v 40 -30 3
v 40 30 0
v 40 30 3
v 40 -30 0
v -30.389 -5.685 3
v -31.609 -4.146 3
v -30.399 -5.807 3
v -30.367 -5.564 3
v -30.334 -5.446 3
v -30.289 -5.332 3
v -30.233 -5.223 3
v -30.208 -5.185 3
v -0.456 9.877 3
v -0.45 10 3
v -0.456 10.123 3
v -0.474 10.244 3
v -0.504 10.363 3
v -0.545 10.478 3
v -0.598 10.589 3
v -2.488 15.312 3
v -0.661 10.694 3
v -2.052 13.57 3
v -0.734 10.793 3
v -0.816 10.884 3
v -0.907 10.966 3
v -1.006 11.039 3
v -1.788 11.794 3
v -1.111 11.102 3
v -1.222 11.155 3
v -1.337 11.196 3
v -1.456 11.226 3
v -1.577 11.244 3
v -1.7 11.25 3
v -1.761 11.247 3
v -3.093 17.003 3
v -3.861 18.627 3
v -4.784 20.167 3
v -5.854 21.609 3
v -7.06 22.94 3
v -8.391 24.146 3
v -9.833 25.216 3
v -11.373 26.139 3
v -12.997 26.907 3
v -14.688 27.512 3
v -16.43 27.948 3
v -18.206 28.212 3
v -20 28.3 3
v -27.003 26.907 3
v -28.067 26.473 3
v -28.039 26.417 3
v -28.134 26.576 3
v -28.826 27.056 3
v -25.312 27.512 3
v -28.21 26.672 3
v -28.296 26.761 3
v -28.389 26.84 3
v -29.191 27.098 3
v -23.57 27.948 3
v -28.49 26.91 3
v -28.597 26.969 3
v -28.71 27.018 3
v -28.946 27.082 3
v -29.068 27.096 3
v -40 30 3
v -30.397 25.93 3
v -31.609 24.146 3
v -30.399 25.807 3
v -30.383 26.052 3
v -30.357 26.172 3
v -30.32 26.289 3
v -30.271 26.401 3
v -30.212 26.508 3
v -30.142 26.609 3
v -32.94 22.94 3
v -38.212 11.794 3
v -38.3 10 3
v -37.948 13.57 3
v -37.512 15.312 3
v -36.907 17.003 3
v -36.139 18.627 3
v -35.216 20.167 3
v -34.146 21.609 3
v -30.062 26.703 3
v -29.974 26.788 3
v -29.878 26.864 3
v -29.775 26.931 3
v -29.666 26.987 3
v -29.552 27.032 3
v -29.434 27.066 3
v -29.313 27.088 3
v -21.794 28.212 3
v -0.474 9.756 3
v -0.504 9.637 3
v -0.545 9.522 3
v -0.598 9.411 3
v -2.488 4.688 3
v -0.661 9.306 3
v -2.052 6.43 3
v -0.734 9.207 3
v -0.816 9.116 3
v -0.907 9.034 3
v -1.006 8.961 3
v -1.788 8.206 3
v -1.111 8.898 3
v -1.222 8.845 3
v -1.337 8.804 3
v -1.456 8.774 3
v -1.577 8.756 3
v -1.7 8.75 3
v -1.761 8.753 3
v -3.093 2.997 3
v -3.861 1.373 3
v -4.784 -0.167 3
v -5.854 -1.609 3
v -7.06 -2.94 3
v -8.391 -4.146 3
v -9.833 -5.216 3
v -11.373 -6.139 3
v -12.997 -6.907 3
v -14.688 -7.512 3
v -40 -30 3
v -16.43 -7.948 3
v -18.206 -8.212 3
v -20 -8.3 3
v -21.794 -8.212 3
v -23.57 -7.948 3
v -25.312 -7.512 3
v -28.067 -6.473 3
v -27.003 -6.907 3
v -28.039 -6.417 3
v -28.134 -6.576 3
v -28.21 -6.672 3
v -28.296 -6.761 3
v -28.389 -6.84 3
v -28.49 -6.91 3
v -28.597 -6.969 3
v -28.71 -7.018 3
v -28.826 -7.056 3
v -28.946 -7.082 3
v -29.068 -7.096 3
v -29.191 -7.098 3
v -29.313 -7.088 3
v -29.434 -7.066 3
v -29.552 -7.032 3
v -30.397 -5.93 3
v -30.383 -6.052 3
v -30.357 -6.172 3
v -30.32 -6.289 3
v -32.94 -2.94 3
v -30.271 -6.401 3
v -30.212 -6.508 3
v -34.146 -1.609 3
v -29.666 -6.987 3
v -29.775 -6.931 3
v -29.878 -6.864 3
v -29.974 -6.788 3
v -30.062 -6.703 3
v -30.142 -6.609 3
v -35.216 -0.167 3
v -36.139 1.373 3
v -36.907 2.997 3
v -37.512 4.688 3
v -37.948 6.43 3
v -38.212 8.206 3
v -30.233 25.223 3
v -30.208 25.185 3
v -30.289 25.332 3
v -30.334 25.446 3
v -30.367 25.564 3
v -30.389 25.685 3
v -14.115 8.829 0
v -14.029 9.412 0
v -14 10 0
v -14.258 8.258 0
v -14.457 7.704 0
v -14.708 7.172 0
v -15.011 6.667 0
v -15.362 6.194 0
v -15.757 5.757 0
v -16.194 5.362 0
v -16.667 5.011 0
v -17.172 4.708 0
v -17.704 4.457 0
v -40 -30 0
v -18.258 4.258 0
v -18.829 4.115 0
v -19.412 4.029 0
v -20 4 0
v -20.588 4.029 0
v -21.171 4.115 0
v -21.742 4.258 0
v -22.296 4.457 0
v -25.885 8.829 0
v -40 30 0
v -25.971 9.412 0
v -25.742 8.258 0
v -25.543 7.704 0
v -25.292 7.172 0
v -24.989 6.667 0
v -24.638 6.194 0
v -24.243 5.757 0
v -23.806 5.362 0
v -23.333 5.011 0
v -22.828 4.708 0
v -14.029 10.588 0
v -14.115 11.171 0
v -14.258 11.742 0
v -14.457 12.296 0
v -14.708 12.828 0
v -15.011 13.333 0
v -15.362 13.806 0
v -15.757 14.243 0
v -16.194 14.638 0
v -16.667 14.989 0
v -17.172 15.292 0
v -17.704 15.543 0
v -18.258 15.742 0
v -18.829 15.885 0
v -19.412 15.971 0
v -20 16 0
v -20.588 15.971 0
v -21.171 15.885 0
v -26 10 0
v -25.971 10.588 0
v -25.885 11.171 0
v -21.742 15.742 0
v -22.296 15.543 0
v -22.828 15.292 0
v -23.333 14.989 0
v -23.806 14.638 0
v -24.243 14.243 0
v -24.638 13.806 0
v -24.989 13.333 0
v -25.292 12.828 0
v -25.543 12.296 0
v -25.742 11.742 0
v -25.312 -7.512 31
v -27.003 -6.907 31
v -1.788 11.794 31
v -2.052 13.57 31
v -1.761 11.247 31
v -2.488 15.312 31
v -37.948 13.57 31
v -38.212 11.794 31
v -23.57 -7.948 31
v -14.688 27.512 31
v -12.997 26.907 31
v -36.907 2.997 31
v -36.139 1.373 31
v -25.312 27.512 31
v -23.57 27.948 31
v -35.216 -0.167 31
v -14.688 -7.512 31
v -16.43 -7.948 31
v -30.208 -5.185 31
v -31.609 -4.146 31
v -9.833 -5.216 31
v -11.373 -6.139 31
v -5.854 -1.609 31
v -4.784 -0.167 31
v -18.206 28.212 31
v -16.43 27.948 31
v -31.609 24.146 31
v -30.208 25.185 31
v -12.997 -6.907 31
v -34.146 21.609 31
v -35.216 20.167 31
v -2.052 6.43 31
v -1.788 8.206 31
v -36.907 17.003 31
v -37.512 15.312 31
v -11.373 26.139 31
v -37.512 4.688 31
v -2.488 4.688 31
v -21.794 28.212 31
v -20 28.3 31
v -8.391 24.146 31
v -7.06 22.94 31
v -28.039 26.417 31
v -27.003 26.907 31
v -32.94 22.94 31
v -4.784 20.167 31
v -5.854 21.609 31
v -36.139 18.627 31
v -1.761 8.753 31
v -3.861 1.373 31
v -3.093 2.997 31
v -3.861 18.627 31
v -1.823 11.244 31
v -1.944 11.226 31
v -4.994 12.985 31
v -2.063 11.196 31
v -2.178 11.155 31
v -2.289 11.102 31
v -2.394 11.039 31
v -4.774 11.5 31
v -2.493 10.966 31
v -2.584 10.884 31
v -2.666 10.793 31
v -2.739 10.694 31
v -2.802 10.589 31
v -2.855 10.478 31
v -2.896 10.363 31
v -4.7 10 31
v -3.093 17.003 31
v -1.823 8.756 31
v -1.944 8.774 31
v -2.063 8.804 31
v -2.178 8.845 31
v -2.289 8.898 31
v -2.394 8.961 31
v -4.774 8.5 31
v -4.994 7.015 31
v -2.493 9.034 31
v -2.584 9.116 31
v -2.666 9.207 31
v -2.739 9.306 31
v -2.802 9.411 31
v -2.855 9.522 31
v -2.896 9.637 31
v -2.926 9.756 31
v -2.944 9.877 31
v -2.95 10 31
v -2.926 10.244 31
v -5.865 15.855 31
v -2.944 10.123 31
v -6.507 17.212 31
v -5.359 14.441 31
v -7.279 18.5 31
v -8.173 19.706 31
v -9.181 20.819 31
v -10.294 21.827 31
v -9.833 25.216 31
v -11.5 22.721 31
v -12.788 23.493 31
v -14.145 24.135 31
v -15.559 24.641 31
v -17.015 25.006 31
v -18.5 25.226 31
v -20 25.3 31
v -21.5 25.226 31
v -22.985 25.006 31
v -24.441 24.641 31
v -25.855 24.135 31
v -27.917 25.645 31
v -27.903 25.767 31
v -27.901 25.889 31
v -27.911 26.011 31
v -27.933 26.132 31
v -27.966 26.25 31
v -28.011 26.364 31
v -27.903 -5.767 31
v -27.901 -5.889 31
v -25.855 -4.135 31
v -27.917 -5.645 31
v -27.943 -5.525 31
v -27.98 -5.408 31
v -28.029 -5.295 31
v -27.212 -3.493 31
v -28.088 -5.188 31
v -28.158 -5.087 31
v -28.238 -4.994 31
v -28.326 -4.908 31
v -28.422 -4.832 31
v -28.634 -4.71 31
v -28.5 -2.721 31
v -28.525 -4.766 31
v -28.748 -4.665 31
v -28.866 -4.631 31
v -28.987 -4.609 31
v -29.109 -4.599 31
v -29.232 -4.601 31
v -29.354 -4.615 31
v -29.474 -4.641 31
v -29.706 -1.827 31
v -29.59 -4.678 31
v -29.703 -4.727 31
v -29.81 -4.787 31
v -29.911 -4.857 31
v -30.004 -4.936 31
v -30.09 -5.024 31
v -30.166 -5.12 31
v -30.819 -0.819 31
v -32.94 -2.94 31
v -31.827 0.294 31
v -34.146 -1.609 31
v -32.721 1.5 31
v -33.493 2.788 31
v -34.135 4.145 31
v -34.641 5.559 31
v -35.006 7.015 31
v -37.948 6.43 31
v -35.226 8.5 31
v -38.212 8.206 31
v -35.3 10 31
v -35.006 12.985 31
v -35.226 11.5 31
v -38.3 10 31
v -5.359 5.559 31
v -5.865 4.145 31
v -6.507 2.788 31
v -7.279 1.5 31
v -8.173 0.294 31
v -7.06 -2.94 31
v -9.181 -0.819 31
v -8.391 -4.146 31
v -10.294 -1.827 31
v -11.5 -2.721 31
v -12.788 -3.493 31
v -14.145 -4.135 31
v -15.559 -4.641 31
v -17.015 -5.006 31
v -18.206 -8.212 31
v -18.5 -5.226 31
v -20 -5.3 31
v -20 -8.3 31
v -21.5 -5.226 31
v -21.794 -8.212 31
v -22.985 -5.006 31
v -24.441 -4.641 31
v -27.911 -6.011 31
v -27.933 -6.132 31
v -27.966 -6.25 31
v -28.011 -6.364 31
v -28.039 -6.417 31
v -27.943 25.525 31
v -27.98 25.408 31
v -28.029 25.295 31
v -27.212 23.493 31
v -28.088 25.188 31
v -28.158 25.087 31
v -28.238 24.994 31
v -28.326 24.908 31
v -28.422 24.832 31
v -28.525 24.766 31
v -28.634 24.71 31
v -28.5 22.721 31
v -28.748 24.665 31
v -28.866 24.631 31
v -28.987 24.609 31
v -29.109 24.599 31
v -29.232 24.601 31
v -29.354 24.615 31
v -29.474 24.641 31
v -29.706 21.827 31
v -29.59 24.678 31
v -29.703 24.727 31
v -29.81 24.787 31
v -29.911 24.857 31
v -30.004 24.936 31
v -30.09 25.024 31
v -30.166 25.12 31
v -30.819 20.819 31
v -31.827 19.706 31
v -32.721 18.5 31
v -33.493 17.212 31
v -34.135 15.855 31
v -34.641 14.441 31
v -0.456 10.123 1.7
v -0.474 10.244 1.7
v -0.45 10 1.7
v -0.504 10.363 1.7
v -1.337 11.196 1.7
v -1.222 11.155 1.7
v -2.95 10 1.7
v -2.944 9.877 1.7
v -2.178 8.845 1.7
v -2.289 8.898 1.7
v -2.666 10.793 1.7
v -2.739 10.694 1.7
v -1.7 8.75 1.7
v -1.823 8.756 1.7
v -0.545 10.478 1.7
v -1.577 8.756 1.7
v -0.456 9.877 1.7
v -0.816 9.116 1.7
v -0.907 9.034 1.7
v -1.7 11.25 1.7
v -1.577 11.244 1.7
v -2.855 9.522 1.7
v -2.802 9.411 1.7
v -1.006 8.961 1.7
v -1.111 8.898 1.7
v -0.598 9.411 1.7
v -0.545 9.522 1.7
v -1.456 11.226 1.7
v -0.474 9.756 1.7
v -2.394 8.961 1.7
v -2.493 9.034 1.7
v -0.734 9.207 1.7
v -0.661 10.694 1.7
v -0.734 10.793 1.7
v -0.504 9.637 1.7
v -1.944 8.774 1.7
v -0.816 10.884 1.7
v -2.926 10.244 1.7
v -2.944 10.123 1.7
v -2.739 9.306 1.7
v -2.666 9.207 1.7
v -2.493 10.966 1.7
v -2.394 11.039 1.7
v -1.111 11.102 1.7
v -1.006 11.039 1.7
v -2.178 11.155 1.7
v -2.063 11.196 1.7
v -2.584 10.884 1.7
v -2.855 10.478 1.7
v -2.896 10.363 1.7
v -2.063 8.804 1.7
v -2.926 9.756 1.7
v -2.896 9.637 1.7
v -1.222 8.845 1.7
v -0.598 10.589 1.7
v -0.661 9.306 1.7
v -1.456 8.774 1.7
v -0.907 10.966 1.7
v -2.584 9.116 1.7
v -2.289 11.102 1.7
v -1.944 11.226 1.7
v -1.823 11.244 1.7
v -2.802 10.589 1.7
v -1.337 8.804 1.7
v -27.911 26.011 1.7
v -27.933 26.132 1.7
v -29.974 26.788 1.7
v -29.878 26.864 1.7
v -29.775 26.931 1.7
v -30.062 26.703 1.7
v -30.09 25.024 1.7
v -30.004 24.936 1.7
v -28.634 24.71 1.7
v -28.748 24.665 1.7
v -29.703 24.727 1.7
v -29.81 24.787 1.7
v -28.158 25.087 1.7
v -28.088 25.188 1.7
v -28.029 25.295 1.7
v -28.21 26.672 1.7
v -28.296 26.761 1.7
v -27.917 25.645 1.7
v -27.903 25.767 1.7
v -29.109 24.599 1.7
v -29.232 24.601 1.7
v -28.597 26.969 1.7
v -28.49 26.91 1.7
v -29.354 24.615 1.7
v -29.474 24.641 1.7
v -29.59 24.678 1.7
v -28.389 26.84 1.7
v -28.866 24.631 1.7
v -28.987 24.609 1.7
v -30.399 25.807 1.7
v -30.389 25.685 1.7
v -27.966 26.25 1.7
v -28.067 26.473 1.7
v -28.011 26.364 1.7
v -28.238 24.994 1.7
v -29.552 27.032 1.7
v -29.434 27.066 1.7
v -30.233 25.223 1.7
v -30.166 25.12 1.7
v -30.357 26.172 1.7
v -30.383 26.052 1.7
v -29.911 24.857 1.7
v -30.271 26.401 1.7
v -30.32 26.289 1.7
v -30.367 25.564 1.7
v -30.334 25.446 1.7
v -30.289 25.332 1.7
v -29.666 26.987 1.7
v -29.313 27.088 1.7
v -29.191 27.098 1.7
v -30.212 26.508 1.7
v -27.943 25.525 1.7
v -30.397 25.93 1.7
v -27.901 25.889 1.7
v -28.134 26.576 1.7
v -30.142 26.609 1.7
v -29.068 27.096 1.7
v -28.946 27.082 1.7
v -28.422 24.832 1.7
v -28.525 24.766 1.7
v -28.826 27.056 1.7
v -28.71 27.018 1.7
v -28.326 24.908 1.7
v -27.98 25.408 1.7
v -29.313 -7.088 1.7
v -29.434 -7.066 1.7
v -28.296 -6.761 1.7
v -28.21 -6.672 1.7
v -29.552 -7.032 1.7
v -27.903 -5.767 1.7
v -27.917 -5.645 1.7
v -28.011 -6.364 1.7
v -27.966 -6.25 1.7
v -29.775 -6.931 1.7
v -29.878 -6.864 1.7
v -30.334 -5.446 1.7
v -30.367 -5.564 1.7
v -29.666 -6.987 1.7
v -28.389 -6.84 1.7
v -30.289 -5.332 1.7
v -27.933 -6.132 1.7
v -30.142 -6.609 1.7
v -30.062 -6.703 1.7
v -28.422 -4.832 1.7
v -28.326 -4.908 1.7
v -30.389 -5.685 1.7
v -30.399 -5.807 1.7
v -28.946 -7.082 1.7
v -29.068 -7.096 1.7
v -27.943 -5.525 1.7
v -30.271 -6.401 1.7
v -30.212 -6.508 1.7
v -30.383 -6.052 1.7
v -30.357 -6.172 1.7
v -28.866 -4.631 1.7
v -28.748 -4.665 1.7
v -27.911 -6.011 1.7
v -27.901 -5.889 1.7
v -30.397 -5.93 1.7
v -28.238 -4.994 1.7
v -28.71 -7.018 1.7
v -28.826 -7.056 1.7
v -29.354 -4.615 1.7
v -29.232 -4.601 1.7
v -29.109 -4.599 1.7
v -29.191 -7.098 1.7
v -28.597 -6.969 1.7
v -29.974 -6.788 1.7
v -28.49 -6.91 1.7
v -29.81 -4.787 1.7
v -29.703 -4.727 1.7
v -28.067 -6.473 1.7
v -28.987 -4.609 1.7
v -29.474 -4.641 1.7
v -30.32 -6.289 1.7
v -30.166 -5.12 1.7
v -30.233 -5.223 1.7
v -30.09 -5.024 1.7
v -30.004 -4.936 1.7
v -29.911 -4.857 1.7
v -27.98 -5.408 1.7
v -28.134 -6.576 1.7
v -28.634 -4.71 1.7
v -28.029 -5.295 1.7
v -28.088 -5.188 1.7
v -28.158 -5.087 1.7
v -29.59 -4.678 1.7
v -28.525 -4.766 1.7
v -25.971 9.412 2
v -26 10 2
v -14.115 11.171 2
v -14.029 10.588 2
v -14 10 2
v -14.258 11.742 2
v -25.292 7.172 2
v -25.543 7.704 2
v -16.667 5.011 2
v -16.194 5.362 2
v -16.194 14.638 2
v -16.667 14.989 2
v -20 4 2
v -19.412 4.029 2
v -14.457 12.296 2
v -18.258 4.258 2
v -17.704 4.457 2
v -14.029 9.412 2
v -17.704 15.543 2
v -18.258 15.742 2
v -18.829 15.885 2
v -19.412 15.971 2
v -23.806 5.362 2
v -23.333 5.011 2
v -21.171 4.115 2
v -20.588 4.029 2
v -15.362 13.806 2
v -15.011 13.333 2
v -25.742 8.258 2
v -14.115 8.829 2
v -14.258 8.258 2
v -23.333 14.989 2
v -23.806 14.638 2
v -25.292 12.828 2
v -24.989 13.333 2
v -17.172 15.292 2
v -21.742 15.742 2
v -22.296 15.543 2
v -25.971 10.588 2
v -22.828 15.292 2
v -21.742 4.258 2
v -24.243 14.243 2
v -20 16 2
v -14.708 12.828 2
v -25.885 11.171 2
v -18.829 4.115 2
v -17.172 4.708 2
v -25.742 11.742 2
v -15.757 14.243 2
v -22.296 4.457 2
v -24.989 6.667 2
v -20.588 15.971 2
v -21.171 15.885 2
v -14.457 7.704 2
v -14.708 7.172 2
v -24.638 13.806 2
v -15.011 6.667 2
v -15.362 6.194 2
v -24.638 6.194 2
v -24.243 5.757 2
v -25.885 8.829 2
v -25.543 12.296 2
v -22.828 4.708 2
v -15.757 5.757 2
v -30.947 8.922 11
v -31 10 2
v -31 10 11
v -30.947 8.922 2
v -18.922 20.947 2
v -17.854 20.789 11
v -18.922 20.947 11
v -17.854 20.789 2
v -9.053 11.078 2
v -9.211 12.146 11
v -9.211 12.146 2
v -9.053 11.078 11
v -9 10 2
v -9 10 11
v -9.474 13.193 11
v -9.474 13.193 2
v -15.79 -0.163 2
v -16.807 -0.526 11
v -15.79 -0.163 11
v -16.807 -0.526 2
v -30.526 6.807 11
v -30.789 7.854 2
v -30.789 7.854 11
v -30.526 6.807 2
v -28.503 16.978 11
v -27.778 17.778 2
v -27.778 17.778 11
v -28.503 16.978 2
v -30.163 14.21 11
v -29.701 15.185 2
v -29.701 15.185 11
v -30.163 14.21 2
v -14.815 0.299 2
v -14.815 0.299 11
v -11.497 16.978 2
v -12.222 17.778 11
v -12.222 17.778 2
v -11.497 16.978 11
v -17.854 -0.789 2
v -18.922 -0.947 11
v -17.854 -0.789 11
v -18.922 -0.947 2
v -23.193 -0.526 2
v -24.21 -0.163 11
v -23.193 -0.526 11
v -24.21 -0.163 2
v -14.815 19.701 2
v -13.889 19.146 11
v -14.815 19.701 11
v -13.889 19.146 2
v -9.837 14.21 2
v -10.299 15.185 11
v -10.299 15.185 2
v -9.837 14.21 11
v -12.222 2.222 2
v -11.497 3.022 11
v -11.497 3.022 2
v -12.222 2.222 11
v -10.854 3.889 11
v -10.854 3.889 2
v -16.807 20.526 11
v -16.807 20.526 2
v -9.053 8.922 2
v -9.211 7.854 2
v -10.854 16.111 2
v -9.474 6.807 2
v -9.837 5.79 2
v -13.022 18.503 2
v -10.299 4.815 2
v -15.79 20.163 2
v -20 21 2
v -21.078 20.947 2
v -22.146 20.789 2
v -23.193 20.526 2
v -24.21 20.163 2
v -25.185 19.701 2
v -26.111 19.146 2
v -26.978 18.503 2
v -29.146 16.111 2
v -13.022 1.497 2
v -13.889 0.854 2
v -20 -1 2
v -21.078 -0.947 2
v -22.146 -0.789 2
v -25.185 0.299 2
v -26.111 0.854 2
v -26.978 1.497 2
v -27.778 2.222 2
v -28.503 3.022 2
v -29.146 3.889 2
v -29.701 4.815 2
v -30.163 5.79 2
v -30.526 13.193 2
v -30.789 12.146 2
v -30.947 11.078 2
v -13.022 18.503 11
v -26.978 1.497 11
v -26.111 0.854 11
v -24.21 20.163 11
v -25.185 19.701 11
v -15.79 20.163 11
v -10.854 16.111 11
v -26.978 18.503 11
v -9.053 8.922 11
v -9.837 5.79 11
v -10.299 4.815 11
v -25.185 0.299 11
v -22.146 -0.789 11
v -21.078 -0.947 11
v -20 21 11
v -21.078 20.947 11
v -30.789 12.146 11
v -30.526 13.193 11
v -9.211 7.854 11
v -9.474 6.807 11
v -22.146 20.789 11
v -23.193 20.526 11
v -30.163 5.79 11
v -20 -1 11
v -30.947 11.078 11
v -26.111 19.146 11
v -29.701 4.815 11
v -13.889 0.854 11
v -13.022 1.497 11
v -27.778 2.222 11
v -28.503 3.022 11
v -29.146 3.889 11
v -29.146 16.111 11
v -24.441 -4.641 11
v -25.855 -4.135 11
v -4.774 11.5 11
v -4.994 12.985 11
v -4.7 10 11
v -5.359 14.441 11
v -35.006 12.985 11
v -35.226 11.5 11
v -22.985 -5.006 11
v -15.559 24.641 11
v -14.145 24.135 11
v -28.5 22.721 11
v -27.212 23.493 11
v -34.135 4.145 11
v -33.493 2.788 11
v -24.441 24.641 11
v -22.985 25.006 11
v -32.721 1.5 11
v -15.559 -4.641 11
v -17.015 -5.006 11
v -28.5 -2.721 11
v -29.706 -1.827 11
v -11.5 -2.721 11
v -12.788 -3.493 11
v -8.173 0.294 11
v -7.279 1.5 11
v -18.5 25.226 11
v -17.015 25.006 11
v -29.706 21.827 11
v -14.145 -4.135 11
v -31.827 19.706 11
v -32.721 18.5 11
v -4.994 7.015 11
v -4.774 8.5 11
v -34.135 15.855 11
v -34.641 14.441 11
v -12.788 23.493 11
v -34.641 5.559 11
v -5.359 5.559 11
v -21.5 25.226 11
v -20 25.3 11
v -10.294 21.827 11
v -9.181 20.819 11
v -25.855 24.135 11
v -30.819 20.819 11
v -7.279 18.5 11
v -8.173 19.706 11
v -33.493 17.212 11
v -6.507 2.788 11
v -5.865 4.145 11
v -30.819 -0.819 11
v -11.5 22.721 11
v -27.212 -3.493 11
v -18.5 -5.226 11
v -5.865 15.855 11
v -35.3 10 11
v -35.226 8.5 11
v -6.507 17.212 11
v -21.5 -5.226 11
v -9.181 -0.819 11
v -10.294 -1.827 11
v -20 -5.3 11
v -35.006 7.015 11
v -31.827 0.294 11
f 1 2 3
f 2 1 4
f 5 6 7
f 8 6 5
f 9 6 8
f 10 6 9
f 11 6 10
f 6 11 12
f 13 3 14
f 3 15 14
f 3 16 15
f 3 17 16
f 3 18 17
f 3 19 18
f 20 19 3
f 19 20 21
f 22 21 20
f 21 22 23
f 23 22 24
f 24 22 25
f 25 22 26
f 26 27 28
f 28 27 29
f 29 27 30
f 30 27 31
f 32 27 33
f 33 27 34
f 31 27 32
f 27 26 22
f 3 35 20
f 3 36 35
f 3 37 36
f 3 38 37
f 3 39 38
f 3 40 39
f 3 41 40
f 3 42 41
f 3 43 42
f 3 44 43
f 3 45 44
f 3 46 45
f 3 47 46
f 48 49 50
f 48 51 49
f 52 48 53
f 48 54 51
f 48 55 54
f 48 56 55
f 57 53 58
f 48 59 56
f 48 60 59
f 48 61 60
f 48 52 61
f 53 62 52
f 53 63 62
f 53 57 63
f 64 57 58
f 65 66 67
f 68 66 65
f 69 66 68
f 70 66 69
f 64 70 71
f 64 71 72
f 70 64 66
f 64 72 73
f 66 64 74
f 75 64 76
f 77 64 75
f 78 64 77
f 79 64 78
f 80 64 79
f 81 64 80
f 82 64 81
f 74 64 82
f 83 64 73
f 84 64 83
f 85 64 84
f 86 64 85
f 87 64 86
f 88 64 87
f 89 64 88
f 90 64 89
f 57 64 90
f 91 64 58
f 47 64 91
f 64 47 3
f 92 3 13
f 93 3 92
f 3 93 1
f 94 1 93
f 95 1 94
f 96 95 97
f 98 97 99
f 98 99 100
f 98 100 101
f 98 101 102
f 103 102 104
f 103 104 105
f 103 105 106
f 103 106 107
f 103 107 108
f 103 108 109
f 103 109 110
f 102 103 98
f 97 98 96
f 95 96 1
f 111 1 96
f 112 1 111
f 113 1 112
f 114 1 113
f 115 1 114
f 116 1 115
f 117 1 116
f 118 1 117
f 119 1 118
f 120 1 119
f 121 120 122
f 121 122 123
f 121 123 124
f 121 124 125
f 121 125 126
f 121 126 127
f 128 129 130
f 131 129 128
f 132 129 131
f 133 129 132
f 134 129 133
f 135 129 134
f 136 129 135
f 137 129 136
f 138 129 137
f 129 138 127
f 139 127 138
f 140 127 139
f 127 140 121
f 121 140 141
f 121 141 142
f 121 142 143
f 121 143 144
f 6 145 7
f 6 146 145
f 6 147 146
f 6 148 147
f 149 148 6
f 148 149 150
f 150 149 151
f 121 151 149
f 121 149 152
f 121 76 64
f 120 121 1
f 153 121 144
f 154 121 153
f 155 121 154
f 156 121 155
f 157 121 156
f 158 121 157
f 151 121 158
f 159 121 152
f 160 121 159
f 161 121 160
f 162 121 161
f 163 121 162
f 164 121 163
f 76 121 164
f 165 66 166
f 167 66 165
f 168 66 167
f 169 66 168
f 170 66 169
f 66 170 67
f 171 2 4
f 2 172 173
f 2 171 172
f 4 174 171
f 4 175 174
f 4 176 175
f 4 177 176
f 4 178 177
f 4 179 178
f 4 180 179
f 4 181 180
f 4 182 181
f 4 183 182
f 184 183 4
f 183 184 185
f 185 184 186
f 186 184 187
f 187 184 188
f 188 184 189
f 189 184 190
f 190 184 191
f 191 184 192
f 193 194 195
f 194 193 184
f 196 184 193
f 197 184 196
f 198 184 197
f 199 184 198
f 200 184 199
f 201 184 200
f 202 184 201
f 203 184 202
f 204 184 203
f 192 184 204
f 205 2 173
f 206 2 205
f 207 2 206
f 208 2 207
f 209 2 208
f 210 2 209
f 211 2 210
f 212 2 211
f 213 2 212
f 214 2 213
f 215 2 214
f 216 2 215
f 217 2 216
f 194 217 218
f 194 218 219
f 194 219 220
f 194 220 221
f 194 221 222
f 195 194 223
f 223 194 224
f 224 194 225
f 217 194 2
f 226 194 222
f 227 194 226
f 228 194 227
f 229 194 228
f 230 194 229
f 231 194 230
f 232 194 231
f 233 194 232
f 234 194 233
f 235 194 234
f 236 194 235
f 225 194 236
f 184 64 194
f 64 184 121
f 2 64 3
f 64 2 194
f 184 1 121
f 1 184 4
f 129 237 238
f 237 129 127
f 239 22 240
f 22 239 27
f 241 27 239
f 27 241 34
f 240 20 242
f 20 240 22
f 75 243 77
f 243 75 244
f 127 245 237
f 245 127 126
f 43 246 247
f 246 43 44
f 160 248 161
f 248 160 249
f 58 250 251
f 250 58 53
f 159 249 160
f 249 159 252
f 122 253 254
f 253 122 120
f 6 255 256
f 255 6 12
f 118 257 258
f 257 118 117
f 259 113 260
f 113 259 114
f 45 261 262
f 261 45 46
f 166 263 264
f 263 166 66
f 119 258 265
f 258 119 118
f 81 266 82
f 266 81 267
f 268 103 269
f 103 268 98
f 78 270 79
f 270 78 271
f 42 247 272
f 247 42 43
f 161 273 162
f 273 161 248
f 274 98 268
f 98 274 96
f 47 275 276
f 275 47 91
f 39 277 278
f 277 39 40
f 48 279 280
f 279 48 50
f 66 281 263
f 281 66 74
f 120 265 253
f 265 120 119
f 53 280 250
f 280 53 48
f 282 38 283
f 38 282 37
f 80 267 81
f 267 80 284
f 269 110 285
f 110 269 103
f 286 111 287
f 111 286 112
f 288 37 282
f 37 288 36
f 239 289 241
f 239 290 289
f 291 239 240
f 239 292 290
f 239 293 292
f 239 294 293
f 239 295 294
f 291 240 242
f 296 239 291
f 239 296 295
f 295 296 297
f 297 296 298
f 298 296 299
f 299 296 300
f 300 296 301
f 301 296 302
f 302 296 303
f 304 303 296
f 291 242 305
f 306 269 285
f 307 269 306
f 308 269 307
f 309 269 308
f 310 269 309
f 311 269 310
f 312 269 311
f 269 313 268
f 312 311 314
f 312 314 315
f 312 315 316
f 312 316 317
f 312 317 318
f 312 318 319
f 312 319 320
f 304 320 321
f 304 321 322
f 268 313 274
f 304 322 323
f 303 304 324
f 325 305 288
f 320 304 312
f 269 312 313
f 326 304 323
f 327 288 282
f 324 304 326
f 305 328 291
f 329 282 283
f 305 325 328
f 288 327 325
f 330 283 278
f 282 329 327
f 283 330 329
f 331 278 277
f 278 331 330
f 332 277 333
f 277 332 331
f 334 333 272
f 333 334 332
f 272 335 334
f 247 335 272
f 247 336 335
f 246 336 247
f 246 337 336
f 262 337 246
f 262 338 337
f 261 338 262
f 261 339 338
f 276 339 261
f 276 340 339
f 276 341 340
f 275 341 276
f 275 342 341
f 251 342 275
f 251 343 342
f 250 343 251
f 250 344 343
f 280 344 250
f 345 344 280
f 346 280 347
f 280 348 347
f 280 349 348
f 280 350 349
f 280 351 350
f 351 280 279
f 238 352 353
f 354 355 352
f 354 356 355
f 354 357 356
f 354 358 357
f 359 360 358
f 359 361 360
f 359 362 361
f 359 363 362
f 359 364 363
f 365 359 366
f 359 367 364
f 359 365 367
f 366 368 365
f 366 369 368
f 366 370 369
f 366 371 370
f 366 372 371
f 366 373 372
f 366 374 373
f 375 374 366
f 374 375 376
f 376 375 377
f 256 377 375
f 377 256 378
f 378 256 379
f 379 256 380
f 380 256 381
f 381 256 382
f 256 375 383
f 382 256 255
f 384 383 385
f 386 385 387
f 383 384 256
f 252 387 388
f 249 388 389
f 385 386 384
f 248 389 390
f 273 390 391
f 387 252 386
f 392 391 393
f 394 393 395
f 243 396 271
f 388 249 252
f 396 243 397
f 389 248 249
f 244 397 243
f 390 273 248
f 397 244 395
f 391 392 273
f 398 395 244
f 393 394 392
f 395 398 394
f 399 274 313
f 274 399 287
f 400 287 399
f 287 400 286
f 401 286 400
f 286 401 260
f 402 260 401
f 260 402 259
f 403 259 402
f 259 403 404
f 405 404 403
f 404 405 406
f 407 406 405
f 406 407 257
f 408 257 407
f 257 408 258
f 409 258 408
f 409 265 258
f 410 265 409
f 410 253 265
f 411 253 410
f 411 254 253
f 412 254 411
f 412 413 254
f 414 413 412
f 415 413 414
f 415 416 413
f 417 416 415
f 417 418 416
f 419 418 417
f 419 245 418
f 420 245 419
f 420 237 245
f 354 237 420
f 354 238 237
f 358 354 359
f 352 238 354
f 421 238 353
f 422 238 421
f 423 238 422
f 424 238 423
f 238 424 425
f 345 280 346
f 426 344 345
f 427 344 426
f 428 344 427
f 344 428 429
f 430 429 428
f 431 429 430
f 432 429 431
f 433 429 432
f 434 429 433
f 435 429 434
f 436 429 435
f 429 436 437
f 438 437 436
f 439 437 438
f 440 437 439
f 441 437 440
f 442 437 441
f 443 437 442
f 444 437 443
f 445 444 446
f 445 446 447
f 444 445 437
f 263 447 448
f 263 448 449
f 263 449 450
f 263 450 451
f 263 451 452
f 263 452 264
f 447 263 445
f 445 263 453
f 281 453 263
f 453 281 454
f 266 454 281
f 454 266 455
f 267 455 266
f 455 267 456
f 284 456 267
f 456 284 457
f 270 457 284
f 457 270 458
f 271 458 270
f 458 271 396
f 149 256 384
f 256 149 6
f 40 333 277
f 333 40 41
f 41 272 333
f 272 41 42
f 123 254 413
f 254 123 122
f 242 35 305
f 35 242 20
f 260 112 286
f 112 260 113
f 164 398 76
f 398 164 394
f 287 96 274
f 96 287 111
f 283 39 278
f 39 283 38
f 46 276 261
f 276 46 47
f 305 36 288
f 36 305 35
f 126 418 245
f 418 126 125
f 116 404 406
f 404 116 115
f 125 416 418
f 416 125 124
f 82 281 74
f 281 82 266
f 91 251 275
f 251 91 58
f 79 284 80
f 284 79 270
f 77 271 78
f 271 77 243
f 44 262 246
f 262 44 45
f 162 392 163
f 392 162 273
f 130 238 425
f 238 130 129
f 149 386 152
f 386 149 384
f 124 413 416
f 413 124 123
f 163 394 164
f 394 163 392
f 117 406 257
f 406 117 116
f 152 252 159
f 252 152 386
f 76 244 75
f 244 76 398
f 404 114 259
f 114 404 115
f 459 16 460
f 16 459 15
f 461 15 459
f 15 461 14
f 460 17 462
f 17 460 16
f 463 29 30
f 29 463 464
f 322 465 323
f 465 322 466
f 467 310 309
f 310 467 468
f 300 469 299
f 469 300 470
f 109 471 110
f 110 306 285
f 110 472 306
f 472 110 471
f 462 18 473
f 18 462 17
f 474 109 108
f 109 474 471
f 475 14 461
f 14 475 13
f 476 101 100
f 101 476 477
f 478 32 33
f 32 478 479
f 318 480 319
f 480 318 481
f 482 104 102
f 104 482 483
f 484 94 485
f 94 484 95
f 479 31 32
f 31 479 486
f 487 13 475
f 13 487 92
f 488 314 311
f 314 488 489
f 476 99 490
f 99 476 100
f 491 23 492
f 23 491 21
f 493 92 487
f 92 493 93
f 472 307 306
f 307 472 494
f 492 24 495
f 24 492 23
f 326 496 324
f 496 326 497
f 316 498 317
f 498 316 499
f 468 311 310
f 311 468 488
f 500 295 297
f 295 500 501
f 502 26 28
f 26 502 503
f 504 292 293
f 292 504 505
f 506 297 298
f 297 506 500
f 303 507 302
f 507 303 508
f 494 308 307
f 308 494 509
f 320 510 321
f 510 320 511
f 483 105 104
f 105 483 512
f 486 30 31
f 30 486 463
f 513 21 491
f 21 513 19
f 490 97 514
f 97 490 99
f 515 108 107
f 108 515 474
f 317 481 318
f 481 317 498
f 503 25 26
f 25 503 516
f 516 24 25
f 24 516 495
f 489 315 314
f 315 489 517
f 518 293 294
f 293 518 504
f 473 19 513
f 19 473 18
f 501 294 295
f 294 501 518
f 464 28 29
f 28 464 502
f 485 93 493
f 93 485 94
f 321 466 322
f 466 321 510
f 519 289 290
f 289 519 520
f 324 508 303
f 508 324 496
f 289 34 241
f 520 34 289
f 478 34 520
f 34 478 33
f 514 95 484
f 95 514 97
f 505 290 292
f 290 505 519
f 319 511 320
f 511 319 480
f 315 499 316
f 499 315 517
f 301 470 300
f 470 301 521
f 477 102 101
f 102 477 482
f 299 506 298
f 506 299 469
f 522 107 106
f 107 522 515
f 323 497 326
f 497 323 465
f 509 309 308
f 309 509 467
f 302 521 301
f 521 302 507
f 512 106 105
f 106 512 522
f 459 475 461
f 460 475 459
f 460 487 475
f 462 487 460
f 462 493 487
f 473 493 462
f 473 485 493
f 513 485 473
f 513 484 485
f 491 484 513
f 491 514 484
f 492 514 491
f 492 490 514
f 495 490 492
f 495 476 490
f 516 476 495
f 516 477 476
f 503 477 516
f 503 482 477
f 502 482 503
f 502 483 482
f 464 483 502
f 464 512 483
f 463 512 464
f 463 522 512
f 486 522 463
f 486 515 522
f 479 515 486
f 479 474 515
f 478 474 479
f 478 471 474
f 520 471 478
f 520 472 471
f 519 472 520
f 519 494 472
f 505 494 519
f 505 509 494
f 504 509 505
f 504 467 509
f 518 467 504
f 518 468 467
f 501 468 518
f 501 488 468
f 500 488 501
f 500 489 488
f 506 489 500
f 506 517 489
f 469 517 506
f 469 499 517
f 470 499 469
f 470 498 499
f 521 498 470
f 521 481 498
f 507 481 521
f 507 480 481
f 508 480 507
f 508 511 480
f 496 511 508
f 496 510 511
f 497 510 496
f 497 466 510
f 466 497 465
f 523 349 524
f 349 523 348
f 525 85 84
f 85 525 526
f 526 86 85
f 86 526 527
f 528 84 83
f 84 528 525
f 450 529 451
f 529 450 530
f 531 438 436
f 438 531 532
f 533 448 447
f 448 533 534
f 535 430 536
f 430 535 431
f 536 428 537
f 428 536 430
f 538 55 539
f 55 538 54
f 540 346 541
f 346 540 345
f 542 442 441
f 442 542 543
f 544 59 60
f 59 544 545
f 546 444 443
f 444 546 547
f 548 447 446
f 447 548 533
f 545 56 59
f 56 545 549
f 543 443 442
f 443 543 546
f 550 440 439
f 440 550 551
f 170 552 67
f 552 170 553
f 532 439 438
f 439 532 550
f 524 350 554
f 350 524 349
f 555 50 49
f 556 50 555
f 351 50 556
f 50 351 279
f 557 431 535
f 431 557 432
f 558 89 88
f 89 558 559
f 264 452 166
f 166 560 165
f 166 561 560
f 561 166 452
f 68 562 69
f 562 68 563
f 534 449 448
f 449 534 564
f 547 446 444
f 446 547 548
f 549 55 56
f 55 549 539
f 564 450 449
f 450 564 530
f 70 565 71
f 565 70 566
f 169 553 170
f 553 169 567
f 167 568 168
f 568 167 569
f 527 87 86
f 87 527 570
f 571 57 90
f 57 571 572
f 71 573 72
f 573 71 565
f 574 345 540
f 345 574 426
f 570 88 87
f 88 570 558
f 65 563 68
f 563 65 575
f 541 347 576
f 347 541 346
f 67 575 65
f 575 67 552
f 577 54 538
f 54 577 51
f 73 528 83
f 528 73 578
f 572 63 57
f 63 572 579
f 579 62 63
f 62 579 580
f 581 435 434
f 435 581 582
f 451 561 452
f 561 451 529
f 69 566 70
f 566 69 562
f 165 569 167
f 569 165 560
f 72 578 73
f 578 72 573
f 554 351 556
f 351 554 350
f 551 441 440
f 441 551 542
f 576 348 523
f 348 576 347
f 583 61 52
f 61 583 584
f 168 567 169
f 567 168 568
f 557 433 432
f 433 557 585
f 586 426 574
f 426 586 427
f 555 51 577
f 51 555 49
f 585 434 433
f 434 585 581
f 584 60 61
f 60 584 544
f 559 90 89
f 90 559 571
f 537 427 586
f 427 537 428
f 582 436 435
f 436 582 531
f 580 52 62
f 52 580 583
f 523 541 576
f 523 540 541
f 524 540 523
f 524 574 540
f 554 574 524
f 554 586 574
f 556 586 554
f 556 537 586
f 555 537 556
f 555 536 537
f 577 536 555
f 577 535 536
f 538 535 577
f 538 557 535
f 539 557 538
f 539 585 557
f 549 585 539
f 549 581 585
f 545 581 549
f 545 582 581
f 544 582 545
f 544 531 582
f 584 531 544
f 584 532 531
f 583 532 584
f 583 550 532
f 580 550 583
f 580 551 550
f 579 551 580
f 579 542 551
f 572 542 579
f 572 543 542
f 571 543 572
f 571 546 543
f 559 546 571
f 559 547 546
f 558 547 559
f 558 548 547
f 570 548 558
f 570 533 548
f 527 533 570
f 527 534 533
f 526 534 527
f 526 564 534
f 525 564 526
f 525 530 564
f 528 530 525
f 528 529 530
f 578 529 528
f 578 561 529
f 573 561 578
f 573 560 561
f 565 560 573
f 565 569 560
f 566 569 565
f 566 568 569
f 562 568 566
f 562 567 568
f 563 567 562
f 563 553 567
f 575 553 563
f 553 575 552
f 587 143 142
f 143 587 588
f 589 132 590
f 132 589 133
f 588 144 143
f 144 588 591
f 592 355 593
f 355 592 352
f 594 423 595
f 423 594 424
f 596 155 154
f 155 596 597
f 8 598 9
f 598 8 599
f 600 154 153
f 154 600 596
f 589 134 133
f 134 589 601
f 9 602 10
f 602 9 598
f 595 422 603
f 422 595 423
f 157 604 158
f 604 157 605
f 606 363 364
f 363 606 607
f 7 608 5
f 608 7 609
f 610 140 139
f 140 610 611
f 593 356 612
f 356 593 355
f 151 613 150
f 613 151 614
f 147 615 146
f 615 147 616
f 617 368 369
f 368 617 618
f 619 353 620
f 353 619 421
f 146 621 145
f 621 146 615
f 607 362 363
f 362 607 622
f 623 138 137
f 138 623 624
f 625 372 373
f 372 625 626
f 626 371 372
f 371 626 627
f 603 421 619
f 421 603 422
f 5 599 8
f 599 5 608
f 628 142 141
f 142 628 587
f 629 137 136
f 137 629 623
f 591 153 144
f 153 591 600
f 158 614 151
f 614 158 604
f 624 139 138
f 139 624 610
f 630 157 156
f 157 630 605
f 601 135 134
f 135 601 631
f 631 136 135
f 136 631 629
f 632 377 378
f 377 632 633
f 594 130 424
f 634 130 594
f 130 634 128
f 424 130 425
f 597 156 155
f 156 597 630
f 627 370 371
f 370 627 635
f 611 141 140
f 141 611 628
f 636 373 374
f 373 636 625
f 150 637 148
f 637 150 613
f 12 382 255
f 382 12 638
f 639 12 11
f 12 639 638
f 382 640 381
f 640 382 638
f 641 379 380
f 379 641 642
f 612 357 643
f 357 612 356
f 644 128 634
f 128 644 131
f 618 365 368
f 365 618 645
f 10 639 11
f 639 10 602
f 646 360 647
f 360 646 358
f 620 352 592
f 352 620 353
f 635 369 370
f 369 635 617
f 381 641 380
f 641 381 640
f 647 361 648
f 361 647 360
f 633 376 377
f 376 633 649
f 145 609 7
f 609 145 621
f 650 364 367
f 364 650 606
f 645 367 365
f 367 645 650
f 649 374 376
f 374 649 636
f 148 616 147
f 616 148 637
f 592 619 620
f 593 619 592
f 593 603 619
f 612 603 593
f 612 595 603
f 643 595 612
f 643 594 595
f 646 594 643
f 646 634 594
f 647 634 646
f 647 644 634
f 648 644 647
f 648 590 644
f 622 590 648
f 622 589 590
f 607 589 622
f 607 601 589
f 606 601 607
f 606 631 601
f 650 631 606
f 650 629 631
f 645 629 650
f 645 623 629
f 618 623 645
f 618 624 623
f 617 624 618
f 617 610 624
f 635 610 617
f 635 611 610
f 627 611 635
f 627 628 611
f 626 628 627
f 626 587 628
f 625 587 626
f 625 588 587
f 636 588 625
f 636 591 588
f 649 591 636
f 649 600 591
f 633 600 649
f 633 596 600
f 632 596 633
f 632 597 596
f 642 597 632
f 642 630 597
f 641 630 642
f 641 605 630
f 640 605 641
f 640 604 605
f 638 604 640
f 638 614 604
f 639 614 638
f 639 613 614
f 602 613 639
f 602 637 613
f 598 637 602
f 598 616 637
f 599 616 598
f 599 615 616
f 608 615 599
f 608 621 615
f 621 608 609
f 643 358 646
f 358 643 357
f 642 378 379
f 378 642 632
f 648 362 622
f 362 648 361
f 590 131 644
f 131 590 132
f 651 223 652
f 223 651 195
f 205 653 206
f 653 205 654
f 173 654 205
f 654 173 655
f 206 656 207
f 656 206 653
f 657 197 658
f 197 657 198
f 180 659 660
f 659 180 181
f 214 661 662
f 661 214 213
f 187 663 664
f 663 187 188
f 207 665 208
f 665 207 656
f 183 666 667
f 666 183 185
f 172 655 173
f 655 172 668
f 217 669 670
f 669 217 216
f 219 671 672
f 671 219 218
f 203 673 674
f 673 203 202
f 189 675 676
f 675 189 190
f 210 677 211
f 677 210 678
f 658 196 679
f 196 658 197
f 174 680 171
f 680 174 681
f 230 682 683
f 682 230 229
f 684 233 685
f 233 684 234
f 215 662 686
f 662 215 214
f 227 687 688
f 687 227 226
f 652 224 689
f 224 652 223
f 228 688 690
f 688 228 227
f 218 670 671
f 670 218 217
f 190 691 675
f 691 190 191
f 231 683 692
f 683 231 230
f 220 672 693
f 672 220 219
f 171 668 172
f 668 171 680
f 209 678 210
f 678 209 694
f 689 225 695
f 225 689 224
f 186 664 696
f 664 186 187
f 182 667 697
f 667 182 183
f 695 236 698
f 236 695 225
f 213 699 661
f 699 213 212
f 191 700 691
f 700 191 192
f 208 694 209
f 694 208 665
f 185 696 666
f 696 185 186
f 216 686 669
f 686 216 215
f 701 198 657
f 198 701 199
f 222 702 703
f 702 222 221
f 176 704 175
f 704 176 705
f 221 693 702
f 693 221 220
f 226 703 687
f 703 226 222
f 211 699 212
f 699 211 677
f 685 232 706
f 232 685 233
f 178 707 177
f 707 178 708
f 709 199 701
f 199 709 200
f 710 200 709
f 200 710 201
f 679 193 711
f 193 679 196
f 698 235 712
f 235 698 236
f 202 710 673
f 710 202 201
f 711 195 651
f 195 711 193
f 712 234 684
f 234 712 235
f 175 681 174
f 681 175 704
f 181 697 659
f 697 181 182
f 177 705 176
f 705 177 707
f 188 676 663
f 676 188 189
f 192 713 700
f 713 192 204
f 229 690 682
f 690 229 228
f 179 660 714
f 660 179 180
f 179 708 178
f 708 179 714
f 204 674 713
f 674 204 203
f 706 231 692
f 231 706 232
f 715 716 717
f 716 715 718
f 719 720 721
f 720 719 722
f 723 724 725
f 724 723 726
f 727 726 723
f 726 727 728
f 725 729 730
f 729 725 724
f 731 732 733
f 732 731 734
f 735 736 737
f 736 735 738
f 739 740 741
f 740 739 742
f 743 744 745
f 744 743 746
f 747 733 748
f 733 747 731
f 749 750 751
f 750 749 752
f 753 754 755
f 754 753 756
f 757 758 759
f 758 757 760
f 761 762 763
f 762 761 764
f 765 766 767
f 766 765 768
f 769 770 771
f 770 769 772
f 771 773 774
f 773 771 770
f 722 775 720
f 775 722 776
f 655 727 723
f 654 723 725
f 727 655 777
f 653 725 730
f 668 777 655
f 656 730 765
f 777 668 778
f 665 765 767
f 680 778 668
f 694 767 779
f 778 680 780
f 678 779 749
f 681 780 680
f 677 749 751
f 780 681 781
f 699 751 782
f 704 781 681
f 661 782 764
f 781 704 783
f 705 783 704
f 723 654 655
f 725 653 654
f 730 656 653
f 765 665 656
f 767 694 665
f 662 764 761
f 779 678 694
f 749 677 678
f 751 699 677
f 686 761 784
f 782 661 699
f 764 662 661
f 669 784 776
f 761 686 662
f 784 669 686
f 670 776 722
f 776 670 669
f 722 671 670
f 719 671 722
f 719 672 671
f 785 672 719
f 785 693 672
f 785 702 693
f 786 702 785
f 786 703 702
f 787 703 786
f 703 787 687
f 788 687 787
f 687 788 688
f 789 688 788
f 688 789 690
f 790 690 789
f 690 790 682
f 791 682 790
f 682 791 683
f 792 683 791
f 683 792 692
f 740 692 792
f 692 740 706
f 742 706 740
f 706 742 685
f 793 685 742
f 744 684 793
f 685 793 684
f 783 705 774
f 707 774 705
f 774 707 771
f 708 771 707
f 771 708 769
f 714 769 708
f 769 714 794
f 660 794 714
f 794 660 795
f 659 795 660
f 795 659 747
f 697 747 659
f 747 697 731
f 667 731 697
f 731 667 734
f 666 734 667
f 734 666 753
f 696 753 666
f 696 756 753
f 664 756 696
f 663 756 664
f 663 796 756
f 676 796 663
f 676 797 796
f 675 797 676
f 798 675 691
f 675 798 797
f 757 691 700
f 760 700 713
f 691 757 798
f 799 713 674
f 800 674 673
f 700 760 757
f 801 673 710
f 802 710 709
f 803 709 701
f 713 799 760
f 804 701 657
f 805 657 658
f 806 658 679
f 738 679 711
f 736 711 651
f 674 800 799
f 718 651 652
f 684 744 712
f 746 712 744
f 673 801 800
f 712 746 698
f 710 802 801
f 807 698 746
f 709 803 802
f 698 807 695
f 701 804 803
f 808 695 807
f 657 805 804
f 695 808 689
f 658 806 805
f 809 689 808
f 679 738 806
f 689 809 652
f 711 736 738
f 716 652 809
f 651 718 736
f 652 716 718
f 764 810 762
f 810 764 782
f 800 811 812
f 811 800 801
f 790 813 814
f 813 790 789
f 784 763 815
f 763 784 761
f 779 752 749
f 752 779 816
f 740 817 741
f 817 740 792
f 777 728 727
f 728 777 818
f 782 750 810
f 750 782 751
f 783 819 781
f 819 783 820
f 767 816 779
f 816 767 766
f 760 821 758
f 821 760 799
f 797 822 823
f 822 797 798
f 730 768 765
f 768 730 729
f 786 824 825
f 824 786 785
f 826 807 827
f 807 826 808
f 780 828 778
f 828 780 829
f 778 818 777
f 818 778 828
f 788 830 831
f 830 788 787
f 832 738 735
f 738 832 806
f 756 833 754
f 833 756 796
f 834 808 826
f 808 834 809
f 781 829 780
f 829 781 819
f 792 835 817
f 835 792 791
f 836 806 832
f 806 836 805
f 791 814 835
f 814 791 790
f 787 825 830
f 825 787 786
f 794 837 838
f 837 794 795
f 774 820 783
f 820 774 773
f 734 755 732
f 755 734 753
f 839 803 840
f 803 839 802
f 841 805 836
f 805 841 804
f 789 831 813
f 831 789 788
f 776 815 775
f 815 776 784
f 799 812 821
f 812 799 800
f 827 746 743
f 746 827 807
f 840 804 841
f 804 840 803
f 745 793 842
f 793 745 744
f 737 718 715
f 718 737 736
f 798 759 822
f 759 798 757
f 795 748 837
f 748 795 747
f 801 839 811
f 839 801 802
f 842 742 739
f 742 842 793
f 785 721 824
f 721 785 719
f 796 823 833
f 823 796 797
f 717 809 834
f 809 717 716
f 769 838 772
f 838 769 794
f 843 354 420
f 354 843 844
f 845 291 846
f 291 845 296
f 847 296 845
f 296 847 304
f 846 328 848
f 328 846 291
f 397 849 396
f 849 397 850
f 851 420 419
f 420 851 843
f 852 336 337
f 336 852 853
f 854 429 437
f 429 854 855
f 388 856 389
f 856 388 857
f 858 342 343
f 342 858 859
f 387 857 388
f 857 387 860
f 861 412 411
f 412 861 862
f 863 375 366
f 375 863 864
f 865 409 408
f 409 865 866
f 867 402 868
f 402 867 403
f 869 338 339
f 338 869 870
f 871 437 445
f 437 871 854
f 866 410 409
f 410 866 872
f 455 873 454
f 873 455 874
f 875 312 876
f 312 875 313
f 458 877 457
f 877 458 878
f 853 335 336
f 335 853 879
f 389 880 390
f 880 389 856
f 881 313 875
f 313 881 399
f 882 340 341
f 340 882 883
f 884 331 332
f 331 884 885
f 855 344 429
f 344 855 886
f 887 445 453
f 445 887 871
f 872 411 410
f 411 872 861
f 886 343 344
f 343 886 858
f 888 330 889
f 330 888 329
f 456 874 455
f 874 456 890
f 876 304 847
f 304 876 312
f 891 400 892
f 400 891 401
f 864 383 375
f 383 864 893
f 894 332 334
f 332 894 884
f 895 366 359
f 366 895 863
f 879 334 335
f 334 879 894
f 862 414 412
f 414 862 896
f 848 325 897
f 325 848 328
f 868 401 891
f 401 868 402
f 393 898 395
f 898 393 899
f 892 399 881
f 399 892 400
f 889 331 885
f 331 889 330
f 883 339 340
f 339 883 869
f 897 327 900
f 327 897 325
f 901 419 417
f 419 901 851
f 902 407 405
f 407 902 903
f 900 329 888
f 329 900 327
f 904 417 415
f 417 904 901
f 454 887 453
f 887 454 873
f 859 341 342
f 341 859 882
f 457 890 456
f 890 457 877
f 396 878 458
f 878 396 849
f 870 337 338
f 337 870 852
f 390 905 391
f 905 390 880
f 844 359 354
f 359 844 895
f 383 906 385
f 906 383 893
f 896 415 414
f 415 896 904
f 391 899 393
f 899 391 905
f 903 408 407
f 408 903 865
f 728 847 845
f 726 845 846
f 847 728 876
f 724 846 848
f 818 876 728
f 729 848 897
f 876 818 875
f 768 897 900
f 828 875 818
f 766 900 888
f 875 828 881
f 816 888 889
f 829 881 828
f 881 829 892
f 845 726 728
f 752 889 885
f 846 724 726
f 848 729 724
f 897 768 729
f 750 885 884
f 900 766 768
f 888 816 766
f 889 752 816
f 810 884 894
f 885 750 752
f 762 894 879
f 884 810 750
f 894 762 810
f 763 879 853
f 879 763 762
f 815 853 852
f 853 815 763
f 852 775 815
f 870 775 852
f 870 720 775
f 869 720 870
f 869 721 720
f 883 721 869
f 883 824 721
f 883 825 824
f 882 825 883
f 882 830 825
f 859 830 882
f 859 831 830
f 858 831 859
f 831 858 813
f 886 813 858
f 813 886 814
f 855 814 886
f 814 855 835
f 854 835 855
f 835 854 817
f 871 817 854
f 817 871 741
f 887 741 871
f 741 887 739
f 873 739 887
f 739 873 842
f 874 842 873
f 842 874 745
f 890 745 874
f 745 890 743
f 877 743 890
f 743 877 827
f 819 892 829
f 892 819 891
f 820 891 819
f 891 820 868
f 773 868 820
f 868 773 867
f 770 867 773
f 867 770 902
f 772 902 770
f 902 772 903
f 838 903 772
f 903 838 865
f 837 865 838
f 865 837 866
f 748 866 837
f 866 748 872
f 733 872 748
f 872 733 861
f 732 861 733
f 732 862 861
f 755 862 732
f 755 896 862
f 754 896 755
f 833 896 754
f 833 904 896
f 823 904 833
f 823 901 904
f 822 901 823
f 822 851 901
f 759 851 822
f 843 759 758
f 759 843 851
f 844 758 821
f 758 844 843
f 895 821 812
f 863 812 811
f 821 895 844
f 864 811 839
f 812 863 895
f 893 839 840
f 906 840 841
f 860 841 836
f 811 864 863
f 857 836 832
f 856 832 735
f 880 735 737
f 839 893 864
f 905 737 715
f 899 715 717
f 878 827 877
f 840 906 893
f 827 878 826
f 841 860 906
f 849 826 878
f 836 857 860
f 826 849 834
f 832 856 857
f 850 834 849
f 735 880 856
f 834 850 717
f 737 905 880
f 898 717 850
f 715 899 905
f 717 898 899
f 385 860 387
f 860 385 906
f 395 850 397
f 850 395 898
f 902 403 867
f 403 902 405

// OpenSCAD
// Adapter: phone camera over microscope eyepiece (30 mm OD), printed phone-side down
// All dimensions in mm, measured with calipers.

// ---- Plate ----
plate_x = 80;   // plate length in X
plate_y = 60;   // plate width in Y
plate_t = 3;    // plate thickness (z = 0..3)
cam_hole_d = 12;    // camera through-hole diameter
cam_hole_x = -20;   // camera hole centre X
cam_hole_y = 10;    // camera hole centre Y

// ---- Sleeve (on camera-hole axis) ----
sleeve_od = 36.6;   // sleeve outer diameter
sleeve_z0 = 3;      // sleeve base (sits on plate top)
sleeve_z1 = 31;     // sleeve top (open)
bore1_d = 22;       // lower bore (camera stop) diameter
bore1_z0 = 3;       // lower bore start
bore1_z1 = 11;      // lower bore end
bore2_d = 30.6;     // upper bore (slides over 30 mm eyepiece) diameter
bore2_z0 = 11;      // upper bore start
bore2_z1 = 31;      // upper bore end (open top)

// ---- M3 centring screw holes ----
screw_hole_d = 2.5;   // radial hole diameter
screw_z = 21;         // hole axis height
screw_n = 3;          // number of radial holes
screw_start = 0;      // first hole points +X

$fn = 64;

// ===================== BODY =====================
module body() { union() {
    // Flat plate on the bed, centred on origin
    translate([-plate_x/2, -plate_y/2, 0])
        cube([plate_x, plate_y, plate_t]);

    // Round sleeve standing on the plate, on the camera-hole axis
    translate([cam_hole_x, cam_hole_y, 0])
        cylinder(h = sleeve_z1, d = sleeve_od, center = false);
} }

// ===================== CUTS =====================
module cuts() { union() {
    // Camera through-hole in the plate (extends 1 mm past each face)
    translate([cam_hole_x, cam_hole_y, -1])
        cylinder(h = plate_t + 2, d = cam_hole_d, center = false);

    // Lower bore (camera stop) - extends 1 mm below plate and 0.5 mm into upper bore
    translate([cam_hole_x, cam_hole_y, bore1_z0 - 1])
        cylinder(h = (bore1_z1 - bore1_z0) + 1.5, d = bore1_d, center = false);

    // Upper bore (slides over eyepiece) - extends 1 mm past open top
    translate([cam_hole_x, cam_hole_y, bore2_z0])
        cylinder(h = (bore2_z1 - bore2_z0) + 1, d = bore2_d, center = false);

    // Three radial 2.5 mm M3 centring-screw holes, 120 deg apart, first in +X.
    // Each hole is a cylinder along local X, offset outward by half the sleeve
    // outer diameter so it spans the sleeve wall (bore2 -> outer), then rotated
    // about the sleeve axis. It extends 1 mm past the outer wall on each side.
    for (i = [0 : screw_n - 1]) {
        a = screw_start + i * 360 / screw_n;
        translate([cam_hole_x, cam_hole_y, screw_z])
        rotate([0, 0, a])
        translate([sleeve_od / 2, 0, 0])
        cylinder(h = sleeve_od + 2, d = screw_hole_d, center = true);
    }
} }

// ===================== FINAL PART =====================
difference() {
    body();
    cuts();
}
